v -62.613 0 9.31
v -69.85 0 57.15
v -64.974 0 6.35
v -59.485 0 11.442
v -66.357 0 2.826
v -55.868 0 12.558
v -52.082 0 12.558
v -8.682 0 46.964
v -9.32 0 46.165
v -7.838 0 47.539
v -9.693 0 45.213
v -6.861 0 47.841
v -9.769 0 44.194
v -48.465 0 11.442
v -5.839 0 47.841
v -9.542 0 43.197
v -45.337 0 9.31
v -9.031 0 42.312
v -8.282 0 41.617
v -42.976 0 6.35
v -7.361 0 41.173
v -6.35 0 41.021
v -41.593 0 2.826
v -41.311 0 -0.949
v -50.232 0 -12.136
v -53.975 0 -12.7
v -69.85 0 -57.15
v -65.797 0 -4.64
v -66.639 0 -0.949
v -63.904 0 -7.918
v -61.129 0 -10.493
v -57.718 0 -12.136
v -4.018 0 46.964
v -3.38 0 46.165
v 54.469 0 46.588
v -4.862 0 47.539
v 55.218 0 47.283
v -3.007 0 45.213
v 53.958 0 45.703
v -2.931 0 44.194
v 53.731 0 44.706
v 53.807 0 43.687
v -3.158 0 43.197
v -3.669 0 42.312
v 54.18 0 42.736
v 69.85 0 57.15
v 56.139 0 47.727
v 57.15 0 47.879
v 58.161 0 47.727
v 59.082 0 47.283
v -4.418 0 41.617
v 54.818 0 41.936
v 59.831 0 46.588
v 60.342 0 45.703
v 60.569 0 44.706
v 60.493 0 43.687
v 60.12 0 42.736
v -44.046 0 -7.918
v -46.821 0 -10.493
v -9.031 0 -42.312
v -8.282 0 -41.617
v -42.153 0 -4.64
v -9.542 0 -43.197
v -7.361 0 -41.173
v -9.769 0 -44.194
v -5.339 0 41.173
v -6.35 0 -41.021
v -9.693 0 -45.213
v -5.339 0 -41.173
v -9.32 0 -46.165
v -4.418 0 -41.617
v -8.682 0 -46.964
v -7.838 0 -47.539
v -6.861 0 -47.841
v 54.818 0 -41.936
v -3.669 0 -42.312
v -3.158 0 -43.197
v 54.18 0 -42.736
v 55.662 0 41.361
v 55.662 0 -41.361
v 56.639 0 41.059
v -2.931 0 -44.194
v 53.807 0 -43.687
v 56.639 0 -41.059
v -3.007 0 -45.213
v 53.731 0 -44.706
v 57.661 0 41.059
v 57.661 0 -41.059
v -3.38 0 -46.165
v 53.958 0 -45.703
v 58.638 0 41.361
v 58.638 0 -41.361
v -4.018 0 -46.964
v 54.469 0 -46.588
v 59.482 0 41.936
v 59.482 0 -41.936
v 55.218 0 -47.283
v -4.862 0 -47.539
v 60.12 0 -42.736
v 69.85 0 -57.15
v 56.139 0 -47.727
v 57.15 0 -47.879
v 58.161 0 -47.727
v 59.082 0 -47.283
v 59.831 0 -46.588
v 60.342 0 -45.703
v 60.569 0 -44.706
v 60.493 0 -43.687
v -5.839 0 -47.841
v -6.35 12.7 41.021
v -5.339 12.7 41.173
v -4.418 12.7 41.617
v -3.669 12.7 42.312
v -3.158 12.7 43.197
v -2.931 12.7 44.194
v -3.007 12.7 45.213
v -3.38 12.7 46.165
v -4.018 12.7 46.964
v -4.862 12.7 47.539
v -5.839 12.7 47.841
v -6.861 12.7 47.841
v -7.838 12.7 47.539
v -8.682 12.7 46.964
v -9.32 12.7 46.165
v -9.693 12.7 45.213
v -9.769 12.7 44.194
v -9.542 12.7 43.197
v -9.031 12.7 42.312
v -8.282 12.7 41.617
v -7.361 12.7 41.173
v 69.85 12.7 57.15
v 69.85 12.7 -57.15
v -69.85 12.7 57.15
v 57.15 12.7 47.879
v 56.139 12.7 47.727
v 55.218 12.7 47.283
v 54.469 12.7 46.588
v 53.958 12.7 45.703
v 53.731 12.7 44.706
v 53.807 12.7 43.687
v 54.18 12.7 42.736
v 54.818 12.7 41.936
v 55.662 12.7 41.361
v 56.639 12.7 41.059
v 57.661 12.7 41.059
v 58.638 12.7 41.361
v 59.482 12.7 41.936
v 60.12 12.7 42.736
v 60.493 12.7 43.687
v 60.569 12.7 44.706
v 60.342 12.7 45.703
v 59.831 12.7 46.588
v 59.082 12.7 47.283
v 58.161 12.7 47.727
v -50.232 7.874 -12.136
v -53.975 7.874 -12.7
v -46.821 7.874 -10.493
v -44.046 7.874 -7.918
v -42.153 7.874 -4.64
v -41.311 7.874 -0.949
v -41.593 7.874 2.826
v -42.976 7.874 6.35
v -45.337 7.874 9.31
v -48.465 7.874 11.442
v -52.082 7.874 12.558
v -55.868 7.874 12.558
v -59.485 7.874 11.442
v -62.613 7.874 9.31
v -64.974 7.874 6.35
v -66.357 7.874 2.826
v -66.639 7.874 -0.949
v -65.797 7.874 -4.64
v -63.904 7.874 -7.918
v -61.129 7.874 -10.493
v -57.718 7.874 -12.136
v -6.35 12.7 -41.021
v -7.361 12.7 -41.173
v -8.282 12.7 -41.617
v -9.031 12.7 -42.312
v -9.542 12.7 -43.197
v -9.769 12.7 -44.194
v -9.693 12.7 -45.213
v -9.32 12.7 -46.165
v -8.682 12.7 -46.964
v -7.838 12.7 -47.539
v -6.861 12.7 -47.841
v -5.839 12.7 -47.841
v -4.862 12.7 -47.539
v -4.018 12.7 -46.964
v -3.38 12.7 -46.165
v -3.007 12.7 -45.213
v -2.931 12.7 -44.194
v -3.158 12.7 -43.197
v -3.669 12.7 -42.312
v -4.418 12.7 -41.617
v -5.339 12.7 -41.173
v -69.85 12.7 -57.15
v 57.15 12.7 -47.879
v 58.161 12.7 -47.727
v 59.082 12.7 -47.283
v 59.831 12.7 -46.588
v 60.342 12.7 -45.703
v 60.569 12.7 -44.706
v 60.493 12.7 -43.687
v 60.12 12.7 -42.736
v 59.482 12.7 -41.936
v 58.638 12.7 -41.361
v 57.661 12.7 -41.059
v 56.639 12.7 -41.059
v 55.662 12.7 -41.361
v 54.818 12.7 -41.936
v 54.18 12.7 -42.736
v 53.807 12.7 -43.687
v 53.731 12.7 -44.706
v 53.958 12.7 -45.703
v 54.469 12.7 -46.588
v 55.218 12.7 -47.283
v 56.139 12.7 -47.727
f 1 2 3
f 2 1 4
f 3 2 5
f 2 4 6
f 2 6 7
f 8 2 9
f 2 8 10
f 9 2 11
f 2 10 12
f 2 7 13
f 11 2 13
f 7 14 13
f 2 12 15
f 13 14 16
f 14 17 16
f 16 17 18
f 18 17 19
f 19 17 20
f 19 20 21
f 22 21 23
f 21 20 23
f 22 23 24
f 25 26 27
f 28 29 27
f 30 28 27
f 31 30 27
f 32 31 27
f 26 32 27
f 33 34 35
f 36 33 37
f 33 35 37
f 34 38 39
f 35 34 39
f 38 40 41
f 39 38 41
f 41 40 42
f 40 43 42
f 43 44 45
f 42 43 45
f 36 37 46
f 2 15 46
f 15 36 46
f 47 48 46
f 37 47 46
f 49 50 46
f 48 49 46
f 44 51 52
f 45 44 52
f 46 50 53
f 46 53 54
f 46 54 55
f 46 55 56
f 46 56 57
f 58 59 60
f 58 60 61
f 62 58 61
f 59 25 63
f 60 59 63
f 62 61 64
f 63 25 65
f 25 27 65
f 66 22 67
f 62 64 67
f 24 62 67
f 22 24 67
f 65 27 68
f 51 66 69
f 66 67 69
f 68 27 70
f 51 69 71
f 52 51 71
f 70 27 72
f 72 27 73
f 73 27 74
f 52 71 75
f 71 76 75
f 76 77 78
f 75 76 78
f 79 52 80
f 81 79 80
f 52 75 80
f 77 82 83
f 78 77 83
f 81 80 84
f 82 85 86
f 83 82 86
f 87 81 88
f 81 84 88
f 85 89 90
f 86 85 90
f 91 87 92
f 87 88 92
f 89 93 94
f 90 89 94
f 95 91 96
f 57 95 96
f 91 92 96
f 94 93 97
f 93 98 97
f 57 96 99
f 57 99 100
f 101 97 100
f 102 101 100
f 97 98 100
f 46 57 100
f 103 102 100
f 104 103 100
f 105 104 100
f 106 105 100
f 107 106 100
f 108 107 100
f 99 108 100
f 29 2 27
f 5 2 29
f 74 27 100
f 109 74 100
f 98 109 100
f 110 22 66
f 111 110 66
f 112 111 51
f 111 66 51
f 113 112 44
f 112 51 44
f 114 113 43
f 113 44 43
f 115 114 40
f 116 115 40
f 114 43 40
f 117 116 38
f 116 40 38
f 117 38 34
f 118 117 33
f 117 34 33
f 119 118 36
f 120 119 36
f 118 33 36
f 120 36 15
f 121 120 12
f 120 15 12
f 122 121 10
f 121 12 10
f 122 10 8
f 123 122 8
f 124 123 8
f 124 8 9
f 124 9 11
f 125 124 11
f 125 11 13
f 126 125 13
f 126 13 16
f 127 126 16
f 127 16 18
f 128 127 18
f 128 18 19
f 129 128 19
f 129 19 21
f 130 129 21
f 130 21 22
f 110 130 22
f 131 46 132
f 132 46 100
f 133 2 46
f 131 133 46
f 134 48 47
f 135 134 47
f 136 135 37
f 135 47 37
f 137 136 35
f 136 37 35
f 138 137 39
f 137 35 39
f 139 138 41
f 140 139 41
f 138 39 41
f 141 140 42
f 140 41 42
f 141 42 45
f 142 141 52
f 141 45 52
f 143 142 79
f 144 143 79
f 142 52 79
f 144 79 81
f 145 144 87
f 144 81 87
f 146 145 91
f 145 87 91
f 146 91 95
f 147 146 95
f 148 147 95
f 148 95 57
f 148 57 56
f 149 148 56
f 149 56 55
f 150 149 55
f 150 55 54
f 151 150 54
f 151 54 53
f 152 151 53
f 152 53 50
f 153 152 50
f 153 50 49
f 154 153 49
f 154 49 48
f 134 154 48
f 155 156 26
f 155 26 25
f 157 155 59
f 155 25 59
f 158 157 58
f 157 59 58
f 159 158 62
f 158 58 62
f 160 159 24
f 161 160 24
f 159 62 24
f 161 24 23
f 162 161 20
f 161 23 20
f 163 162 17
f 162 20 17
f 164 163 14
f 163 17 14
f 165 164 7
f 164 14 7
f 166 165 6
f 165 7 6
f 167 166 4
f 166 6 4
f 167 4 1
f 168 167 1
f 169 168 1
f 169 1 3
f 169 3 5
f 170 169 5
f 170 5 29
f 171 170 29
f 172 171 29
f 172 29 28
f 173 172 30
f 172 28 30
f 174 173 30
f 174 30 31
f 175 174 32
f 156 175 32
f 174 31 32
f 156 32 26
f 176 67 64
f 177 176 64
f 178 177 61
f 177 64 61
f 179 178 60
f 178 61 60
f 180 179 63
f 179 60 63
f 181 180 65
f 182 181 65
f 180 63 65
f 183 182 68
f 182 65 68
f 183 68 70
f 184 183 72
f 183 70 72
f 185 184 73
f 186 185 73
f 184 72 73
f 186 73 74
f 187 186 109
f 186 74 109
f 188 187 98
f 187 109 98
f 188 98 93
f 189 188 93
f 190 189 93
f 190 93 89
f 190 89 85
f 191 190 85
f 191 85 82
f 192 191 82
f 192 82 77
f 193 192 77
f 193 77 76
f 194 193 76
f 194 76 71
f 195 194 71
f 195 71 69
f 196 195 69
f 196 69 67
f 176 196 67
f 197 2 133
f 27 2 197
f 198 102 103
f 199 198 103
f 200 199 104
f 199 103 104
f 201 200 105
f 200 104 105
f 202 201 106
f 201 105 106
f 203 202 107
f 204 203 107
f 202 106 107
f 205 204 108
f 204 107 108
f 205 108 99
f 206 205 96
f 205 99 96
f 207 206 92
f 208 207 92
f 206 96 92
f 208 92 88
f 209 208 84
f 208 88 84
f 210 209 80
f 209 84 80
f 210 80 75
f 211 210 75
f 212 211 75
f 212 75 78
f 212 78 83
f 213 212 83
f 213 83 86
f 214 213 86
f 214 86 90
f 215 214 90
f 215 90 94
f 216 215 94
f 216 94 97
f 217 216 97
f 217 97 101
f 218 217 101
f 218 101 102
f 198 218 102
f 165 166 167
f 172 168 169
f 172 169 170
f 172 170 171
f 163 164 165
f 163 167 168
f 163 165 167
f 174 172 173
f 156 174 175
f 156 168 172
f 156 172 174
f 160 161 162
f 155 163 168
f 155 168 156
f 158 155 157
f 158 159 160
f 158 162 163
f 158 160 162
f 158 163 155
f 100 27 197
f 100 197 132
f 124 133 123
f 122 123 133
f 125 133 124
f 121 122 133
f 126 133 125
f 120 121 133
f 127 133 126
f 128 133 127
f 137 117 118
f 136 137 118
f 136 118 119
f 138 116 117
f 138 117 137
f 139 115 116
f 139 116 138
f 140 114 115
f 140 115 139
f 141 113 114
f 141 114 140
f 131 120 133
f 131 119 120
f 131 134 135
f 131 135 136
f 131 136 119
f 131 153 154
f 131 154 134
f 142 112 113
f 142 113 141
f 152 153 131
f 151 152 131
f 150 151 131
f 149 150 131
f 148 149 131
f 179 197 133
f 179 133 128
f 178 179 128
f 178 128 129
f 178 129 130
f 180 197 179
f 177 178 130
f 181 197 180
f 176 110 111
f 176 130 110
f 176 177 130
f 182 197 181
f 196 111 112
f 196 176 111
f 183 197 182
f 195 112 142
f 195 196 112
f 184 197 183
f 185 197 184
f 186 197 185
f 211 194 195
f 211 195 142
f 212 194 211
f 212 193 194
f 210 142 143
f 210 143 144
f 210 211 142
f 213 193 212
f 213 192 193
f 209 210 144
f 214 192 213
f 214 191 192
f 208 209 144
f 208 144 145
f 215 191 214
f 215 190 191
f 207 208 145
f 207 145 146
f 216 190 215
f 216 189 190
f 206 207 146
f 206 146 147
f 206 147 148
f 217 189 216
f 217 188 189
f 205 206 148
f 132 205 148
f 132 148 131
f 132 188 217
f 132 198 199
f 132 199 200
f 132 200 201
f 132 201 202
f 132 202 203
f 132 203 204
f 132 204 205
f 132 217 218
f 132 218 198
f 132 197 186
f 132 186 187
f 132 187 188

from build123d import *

# Parameters (mm, degrees)
SKETCH1_W           = 139.7
SKETCH1_H           = 114.3
BOSS_EXTRUDE1_DEPTH = 12.7
CUT_EXTRUDE2_REACH  = 93.14
SKETCH3_R           = 3.429
SKETCH4_R           = 12.7
CUT_EXTRUDE3_DEPTH  = 7.874


with BuildPart() as part:
    # Sketch1 → Boss-Extrude1 (new body)
    with BuildSketch(Plane(origin=(0, 0, 0), x_dir=(1, 0, 0), z_dir=(0, 1, 0))):
        Rectangle(SKETCH1_W, SKETCH1_H)
    extrude(amount=BOSS_EXTRUDE1_DEPTH)

    # Sketch3 → Cut-Extrude2 (cut, up to next)
    with BuildSketch(Plane.XZ, mode=Mode.PRIVATE) as cut_extrude2_sk1:
        with Locations(Location((-6.35, 44.45, 0), (0, 0, 270))):
            Circle(SKETCH3_R)
    cut_extrude2_tool1 = extrude(cut_extrude2_sk1.sketch, amount=-CUT_EXTRUDE2_REACH, mode=Mode.PRIVATE) & part.part
    # Sketch3 → Cut-Extrude2 (cut, up to next)
    with BuildSketch(Plane.XZ, mode=Mode.PRIVATE) as cut_extrude2_sk2:
        with Locations(Location((-6.35, -44.45, 0), (0, 0, 90))):
            Circle(SKETCH3_R)
    cut_extrude2_tool2 = extrude(cut_extrude2_sk2.sketch, amount=-CUT_EXTRUDE2_REACH, mode=Mode.PRIVATE) & part.part
    # Sketch3 → Cut-Extrude2 (cut, up to next)
    with BuildSketch(Plane.XZ, mode=Mode.PRIVATE) as cut_extrude2_sk3:
        with Locations(Location((57.15, 44.45, 0), (0, 0, 90))):
            Circle(SKETCH3_R)
    cut_extrude2_tool3 = extrude(cut_extrude2_sk3.sketch, amount=-CUT_EXTRUDE2_REACH, mode=Mode.PRIVATE) & part.part
    # Sketch3 → Cut-Extrude2 (cut, up to next)
    with BuildSketch(Plane.XZ, mode=Mode.PRIVATE) as cut_extrude2_sk4:
        with Locations(Location((57.15, -44.45, 0), (0, 0, 270))):
            Circle(SKETCH3_R)
    cut_extrude2_tool4 = extrude(cut_extrude2_sk4.sketch, amount=-CUT_EXTRUDE2_REACH, mode=Mode.PRIVATE) & part.part
    add(cut_extrude2_tool1.solids().sort_by_distance((-6.35, 0, 44.45))[0], mode=Mode.SUBTRACT)
    add(cut_extrude2_tool2.solids().sort_by_distance((-6.35, 0, -44.45))[0], mode=Mode.SUBTRACT)
    add(cut_extrude2_tool3.solids().sort_by_distance((57.15, 0, 44.45))[0], mode=Mode.SUBTRACT)
    add(cut_extrude2_tool4.solids().sort_by_distance((57.15, 0, -44.45))[0], mode=Mode.SUBTRACT)

    # Sketch4 → Cut-Extrude3 (cut)
    with BuildSketch(Plane.XZ):
        with Locations(Location((-53.975, 0, 0), (0, 0, 270))):
            Circle(SKETCH4_R)
    extrude(amount=-CUT_EXTRUDE3_DEPTH, mode=Mode.SUBTRACT)


solid = part.part
